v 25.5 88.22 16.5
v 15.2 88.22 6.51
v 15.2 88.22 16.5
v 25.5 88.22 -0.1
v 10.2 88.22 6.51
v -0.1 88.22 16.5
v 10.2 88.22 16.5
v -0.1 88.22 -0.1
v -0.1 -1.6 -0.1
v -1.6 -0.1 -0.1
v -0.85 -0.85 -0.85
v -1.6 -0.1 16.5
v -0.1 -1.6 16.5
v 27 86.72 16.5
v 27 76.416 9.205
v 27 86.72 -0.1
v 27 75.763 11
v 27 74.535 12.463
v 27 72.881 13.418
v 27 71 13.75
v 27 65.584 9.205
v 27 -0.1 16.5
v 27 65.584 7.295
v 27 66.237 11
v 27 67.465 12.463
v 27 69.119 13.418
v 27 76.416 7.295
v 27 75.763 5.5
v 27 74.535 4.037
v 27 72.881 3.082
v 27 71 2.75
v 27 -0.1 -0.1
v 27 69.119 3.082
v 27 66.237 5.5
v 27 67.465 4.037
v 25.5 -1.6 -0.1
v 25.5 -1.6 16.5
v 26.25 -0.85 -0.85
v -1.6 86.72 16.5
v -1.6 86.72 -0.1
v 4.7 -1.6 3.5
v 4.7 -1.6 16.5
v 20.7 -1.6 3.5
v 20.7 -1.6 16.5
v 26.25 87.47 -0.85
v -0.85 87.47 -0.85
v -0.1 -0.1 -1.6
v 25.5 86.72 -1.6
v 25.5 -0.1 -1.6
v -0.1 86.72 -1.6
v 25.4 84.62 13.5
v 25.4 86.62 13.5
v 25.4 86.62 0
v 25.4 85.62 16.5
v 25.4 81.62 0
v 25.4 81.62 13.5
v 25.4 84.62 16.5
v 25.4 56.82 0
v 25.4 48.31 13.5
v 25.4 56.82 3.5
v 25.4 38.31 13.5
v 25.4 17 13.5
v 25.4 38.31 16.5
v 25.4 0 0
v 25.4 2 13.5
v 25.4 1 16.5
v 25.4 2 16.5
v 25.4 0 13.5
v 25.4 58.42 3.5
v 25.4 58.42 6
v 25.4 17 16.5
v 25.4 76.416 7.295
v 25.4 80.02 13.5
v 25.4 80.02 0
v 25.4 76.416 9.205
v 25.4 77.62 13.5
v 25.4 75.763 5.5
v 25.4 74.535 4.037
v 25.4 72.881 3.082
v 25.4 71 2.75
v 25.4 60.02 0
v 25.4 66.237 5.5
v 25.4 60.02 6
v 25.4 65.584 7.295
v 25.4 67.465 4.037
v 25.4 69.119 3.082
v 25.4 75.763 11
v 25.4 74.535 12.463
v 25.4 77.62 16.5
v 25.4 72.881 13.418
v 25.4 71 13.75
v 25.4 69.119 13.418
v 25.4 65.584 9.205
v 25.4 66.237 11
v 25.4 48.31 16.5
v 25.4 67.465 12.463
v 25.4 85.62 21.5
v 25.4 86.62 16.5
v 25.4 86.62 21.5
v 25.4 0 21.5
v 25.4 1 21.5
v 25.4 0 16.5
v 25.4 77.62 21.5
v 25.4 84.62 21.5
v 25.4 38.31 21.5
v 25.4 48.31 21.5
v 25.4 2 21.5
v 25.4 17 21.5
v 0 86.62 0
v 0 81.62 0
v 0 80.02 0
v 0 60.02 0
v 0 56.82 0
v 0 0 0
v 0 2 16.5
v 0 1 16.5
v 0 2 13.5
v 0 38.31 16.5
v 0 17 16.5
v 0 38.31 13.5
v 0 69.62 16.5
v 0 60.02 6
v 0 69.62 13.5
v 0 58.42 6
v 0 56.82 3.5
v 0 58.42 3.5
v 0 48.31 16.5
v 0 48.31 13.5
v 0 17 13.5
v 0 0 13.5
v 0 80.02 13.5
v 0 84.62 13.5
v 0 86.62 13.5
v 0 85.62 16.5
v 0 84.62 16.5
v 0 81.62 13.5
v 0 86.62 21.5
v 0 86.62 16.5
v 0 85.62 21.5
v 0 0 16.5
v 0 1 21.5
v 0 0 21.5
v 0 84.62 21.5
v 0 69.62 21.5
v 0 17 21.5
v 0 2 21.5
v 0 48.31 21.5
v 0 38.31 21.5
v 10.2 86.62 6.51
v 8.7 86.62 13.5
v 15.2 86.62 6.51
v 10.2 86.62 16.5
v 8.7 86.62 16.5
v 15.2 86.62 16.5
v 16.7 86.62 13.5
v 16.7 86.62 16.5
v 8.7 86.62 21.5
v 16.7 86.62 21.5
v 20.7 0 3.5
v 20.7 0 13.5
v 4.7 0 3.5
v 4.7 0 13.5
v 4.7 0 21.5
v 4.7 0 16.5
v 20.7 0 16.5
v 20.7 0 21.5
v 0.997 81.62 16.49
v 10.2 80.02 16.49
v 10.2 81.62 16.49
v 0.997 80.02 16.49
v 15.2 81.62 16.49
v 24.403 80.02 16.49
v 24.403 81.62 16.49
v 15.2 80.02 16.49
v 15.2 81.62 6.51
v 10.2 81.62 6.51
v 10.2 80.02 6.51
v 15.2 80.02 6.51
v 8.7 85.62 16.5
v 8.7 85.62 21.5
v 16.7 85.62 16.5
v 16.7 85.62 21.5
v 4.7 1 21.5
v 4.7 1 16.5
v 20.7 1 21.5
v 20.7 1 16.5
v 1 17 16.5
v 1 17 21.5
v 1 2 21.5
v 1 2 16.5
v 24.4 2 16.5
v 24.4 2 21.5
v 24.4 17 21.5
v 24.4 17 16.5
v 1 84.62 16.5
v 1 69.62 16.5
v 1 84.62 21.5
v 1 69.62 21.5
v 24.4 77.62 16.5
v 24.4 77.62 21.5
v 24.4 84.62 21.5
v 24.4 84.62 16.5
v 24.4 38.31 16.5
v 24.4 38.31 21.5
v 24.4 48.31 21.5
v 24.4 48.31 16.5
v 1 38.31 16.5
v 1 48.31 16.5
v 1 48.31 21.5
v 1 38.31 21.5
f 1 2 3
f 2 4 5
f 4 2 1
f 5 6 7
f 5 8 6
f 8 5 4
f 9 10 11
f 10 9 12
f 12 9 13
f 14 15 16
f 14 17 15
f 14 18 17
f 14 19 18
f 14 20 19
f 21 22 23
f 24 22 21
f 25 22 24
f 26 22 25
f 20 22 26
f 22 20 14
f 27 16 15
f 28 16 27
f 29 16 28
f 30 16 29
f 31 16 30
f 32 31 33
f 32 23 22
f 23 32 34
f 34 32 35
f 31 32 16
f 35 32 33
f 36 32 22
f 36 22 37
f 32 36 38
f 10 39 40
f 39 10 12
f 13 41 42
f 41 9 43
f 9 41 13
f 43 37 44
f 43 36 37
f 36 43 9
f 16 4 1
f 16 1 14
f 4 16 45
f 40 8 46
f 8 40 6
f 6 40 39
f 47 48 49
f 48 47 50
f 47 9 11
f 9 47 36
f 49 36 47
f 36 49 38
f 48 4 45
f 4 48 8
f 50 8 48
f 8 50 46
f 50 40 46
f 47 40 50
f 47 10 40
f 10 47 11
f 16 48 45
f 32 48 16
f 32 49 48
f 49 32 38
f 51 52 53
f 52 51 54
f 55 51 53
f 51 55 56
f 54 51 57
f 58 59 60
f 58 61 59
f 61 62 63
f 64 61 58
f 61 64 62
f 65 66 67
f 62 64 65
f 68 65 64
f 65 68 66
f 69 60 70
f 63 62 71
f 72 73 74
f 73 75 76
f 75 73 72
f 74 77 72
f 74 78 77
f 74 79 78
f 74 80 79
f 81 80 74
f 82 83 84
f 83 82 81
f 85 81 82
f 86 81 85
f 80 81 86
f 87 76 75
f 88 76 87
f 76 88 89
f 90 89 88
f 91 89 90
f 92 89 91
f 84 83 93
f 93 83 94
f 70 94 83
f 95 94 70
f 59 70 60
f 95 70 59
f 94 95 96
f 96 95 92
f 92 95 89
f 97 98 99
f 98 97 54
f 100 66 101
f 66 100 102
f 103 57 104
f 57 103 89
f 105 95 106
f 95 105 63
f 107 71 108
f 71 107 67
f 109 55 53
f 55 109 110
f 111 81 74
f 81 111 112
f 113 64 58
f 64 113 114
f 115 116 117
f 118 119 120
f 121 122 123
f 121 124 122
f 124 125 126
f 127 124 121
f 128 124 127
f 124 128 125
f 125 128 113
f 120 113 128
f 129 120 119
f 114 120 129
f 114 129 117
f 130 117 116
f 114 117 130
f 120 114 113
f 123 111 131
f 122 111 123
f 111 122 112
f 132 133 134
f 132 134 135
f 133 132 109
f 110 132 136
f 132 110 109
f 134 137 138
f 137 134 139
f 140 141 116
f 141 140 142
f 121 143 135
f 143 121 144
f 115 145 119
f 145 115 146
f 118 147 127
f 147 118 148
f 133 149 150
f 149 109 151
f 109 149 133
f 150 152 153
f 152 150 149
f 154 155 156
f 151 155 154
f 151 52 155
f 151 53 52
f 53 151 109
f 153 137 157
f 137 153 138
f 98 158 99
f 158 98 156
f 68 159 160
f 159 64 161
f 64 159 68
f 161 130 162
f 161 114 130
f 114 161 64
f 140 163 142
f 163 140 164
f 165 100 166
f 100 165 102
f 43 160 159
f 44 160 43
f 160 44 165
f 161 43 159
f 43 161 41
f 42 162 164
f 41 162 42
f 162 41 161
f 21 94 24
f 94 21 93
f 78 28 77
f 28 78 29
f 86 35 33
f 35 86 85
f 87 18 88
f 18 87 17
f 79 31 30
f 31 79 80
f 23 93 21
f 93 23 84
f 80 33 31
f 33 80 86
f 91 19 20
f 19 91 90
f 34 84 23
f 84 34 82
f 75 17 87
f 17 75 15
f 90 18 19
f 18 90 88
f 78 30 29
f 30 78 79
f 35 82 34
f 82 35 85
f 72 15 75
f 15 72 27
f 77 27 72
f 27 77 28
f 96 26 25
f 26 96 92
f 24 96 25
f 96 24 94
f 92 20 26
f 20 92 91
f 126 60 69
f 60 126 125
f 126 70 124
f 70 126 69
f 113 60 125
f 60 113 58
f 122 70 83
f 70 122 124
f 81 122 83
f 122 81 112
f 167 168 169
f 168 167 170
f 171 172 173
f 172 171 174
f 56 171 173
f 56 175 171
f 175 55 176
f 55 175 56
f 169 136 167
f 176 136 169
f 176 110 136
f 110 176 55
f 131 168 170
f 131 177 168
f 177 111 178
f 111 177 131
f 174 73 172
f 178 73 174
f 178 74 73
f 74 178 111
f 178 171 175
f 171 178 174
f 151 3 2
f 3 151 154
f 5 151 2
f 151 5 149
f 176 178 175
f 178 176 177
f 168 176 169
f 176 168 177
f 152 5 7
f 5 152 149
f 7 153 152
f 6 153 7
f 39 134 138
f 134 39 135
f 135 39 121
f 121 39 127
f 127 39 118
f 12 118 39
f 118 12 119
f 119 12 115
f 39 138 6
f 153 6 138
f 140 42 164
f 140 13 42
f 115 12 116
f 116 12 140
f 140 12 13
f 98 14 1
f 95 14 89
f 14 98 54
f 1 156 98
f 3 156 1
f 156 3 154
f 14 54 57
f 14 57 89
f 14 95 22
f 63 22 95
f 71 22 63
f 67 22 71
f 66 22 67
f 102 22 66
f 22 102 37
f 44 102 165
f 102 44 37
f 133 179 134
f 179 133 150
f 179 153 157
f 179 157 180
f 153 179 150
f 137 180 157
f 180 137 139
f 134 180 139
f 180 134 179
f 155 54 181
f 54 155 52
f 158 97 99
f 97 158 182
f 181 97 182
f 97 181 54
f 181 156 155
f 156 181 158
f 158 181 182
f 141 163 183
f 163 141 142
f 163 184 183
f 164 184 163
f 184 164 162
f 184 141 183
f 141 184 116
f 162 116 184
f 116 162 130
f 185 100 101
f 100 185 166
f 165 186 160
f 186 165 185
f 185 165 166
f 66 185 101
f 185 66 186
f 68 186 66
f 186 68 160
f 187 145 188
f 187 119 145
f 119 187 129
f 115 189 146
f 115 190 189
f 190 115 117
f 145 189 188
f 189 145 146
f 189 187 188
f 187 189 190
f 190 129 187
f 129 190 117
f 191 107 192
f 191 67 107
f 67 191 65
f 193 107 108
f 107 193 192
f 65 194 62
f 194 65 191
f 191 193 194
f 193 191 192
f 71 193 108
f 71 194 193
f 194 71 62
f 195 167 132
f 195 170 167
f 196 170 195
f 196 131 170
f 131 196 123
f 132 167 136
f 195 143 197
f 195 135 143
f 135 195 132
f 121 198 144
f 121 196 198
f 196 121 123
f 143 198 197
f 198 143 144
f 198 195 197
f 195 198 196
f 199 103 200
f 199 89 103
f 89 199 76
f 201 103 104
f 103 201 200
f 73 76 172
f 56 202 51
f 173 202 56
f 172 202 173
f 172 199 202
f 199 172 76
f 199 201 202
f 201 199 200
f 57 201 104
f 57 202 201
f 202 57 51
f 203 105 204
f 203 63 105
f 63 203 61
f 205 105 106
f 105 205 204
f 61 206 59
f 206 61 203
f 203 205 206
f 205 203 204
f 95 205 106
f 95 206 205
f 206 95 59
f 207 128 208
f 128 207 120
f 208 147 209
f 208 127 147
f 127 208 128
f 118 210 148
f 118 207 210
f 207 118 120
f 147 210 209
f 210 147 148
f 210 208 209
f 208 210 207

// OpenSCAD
inch = 25.4;

wall = 1.6;
board_x = 1*inch;
board_y = 2.3*inch;
board_z = 15.2;
board_standoff = 3.5;

cable_compartment_y = 20;
antipull_compartment_y = 5;

case_x = board_x;
case_y = board_y + wall + cable_compartment_y + wall + antipull_compartment_y;
case_z = 25;

bottom_y = 16.5;

rj45_back = 16.4;
rj45_xlen = 16;
rj45_zlen = 13.6;


inf = 200;

eps=0.01;


module chamfered_rect(xlen, ylen, chamfer) {
	polygon([
		[0, chamfer], [chamfer, 0],
		[xlen-chamfer, 0], [xlen, chamfer],
		[xlen, ylen-chamfer], [xlen-chamfer, ylen],
		[chamfer, ylen], [0, ylen-chamfer]
	]);
}

module chamfered_cube(xlen, ylen, zlen, chamfer) {
	intersection() {
		linear_extrude(zlen) chamfered_rect(xlen, ylen, chamfer);
		rotate([90,0,90]) linear_extrude(xlen) chamfered_rect(ylen, zlen, chamfer);
		mirror([0,1,0]) rotate([90,0,0]) linear_extrude(ylen) chamfered_rect(xlen, zlen, chamfer);
	}
}

module case() {
	difference() {
		union() {
			difference() {
				translate([-wall, -wall, -wall]) chamfered_cube(case_x + 2*wall,case_y + 2*wall,case_z + 2*wall, 1.5);
				cube([case_x, case_y, case_z]);
				
				translate([board_x/2, 0, board_standoff + rj45_zlen/2])
					cube([rj45_xlen, 3*wall, rj45_zlen], center=true);
				
				translate([case_x, 71, bottom_y/2]) rotate([0,90,0])
					cylinder(3*wall, d=11, center=true);
			}
			
			translate([0, board_y-wall, 0]) cube([board_x, wall, board_standoff]);
			translate([0, board_y, 0]) cube([board_x, wall, board_standoff + 2.5]);
			
			translate([0, case_y-antipull_compartment_y-wall, 0]) cube([board_x, wall, bottom_y-0.01]);
		}
		
		cable_slot_zlen = 10;
		translate([case_x/2 - 5/2,case_y-antipull_compartment_y-eps-wall, bottom_y - cable_slot_zlen+eps])
			cube([5, antipull_compartment_y+2*wall+0.1, cable_slot_zlen]);
	}
}

module clip(l) {
	clip_wall = 1;
	clip_height = 5;
	
	translate([0,l,bottom_y])
	rotate([90,0,0])
	
	linear_extrude(l)
		polygon([
			[0, -3],
			[1, 0],
			[1, clip_height],
			[0, clip_height],
		]);
}

module clip_left(l, y0) {
	translate([0,y0,0]) clip(l);
}

module clip_right(l, y0) {
	translate([case_x, y0, 0]) mirror([1,0,0]) clip(l);
}

module clip_front(l, x0) {
	translate([l+x0,0,0]) rotate([0,0,90]) clip(l);
}

module clip_back(l, x0) {
	translate([x0,case_y,0]) rotate([0,0,-90]) clip(l);
}


module top() {
	intersection() {
		case();
		translate([-inf/2, -inf/2, bottom_y]) cube([inf, inf, inf]);
	}	
}

module bottom() {
	difference() {
		case();
		translate([-inf/2, -inf/2, bottom_y]) cube([inf, inf, inf]);
	}
	
	clip_back(case_x / 2 - 8/2, 0);
	clip_back(case_x / 2 - 8/2, case_x/2 + 8/2);
	clip_front(case_x / 2 - rj45_xlen / 2, 0);
	clip_front(case_x / 2 - rj45_xlen / 2, case_x / 2 + rj45_xlen / 2);
	clip_left(15, 2);
	clip_right(15, 2);
	clip_left(15, case_y-15-2);
	clip_right(7, case_y-7-2);
	clip_right(10, case_y/2-10/2);
	clip_left(10, case_y/2-10/2);
}

//top();
bottom();
